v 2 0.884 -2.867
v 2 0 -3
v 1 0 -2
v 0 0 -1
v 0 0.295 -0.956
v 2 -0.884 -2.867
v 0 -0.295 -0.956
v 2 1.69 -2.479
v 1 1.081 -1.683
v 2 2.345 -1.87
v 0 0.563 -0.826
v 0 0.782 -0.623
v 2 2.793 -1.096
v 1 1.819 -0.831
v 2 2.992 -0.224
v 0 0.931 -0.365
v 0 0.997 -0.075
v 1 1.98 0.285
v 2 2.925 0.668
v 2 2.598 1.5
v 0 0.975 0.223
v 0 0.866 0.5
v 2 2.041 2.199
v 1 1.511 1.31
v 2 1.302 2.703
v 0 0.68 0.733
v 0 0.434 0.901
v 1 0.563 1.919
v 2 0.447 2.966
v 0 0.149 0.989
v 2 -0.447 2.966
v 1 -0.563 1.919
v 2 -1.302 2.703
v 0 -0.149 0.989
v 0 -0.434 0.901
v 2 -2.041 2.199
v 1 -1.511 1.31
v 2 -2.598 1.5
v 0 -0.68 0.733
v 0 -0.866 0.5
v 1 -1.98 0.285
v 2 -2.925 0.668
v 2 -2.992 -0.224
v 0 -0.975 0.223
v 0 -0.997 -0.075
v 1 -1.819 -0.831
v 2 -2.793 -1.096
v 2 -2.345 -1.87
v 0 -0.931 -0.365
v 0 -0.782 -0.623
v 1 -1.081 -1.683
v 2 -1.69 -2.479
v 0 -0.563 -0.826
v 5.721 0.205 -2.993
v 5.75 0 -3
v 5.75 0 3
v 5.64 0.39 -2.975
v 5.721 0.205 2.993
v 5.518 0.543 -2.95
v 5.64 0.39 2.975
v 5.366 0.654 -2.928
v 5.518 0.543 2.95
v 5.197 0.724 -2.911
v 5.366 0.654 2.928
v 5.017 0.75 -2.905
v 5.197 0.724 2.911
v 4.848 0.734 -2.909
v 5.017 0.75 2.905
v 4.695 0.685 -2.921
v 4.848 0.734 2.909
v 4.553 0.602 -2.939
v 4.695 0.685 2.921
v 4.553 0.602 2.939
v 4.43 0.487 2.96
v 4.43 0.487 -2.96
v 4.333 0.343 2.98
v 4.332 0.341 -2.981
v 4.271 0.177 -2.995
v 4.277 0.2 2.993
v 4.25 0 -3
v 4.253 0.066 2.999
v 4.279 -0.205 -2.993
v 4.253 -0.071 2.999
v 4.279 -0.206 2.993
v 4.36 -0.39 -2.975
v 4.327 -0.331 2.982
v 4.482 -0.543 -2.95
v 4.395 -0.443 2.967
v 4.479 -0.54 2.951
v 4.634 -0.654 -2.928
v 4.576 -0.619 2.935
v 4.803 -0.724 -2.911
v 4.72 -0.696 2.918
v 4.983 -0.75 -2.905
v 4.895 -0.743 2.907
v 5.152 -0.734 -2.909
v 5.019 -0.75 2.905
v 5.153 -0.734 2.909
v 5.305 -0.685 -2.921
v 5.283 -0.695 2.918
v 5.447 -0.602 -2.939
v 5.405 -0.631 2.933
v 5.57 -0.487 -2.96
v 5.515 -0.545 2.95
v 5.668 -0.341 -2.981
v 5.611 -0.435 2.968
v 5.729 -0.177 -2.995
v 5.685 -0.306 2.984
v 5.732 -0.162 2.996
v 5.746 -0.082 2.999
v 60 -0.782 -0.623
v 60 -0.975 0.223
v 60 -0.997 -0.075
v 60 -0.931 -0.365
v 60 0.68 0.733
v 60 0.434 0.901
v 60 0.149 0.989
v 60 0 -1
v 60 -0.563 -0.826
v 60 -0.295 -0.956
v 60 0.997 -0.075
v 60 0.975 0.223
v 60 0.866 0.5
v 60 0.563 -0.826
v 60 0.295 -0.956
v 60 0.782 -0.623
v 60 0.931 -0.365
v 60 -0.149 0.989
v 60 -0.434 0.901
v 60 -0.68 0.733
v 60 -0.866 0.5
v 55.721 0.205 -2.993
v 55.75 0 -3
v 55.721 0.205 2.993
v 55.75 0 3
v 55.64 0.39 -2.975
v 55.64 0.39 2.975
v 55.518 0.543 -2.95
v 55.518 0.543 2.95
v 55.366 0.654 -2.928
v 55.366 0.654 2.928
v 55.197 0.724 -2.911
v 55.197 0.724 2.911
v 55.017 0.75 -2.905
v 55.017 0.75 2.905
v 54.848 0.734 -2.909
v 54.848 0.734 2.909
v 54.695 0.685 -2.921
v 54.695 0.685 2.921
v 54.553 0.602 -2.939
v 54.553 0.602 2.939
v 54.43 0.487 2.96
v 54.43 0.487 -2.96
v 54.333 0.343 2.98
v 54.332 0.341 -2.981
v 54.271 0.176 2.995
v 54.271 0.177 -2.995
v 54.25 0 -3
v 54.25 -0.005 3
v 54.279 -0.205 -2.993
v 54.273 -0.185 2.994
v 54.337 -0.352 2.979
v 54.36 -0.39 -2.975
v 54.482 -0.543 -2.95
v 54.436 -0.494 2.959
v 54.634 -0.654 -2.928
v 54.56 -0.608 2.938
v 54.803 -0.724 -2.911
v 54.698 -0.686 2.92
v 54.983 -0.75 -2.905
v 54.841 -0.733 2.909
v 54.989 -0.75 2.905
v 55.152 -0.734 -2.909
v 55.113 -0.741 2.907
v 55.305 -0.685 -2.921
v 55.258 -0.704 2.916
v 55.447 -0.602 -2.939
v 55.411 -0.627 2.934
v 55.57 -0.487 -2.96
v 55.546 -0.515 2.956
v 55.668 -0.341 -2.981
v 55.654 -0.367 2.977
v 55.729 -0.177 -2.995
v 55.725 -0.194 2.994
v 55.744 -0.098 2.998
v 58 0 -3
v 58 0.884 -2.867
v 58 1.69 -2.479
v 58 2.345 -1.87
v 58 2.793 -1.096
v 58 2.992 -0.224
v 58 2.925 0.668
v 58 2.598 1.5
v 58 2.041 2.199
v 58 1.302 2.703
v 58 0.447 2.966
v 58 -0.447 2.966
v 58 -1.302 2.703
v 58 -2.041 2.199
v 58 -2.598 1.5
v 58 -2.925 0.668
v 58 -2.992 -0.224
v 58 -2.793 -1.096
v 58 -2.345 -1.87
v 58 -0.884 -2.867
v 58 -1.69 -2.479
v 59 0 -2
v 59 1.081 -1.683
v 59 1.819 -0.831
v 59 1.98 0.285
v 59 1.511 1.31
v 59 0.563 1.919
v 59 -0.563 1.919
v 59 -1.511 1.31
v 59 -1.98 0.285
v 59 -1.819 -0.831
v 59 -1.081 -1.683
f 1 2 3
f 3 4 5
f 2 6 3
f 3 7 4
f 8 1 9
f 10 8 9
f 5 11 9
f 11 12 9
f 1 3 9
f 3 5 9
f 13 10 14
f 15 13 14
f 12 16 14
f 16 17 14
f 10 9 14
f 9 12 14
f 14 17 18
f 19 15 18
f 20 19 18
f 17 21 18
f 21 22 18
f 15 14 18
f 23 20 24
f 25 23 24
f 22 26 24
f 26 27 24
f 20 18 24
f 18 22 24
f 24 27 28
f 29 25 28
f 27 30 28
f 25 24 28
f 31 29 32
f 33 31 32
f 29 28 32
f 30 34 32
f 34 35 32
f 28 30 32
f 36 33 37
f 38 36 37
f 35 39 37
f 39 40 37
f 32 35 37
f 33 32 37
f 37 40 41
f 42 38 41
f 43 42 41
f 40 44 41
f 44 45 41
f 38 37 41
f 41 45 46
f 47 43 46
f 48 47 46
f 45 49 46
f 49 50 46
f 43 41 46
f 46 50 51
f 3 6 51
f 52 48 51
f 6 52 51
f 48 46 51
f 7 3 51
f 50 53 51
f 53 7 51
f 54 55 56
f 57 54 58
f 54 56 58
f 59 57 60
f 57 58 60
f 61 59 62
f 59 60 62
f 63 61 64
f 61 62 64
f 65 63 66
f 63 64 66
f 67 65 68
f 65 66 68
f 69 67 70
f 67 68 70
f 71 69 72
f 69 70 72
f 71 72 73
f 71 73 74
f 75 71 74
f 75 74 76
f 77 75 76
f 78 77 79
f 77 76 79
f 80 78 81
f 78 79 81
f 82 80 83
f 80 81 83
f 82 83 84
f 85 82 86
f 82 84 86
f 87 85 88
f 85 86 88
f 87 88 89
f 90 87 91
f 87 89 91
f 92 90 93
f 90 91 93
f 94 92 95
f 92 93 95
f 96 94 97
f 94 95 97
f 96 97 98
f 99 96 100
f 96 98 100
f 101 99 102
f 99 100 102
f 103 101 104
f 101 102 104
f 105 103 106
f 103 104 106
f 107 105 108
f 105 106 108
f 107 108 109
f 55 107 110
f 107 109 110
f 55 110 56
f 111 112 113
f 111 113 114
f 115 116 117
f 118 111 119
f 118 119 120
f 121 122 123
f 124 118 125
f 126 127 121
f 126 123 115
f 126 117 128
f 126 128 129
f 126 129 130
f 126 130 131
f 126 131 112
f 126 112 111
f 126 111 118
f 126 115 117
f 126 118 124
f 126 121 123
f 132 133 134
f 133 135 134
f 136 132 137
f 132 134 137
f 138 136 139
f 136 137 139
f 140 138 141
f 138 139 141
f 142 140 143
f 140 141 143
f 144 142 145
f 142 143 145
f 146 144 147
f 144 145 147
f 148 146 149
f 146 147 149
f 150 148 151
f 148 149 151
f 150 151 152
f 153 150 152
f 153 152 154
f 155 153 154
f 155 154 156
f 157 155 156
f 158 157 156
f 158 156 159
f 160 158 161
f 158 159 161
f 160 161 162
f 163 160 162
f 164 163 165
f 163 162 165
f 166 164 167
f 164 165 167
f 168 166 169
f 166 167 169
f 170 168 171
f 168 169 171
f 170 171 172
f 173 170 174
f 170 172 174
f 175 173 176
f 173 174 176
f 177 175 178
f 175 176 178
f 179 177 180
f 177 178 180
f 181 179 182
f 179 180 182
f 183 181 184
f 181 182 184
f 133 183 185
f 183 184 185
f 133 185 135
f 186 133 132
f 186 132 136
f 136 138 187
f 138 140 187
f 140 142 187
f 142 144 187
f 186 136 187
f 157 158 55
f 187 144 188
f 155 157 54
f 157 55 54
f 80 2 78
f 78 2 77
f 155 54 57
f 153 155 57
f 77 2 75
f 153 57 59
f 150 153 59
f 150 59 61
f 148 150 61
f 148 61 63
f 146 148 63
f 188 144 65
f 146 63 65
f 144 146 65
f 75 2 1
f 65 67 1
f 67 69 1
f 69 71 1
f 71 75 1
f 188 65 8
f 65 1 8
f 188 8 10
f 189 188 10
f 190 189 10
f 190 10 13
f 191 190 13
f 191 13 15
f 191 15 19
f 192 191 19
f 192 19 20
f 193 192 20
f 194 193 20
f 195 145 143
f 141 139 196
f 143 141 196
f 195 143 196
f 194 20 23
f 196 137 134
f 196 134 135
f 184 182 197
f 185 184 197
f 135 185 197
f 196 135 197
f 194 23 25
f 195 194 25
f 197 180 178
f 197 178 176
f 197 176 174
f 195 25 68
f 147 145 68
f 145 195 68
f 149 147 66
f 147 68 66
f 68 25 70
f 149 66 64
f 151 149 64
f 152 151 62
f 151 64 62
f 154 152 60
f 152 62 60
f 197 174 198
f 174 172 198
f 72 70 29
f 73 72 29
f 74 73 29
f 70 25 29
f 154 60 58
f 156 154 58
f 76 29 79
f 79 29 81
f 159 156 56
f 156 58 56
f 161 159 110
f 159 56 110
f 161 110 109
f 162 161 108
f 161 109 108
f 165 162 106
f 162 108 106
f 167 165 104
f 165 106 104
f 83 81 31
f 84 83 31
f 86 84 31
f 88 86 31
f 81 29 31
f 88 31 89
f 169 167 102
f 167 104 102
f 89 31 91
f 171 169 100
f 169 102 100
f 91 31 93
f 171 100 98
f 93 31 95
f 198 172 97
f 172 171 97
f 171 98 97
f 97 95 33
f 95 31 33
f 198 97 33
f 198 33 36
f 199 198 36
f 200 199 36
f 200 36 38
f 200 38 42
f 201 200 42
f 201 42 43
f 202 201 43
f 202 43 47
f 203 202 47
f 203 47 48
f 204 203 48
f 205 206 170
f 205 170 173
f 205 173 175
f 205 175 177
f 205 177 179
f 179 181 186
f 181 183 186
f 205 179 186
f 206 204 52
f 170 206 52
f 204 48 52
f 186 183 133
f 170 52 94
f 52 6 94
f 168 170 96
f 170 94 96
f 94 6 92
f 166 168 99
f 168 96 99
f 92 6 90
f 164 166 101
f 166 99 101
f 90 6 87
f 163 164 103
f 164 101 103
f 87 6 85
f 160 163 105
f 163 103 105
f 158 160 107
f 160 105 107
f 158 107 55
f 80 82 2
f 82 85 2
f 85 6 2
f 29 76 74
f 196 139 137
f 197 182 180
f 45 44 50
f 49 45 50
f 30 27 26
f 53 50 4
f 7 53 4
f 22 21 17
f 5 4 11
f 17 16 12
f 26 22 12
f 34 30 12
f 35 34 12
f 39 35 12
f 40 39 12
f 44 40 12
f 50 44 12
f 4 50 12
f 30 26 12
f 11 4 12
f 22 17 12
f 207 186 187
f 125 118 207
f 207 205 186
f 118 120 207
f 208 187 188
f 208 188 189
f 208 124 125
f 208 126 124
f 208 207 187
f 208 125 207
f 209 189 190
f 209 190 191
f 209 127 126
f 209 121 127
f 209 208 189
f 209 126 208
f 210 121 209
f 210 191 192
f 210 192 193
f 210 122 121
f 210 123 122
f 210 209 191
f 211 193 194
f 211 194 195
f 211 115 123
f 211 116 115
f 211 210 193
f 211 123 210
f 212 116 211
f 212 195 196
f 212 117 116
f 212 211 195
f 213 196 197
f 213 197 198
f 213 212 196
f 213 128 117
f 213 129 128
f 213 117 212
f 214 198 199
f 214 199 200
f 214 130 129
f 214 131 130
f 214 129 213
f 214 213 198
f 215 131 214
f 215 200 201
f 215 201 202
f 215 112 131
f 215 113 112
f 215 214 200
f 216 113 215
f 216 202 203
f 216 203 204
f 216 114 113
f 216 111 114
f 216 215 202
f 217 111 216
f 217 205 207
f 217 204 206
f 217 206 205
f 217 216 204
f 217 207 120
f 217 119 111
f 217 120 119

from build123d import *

# Parameters (mm, degrees)
SKETCH_1_R               = 3
EXTRUDE_1_DEPTH          = 60
CHAMFER_1_SIZE           = 2
SKETCH_2_R               = 0.75
CUT_EXTRUDE_1_DEPTH      = 4
CUT_EXTRUDE_1_DEPTH_BACK = 4


with BuildPart() as part:
    # Эскиз1 → Бобышка-Вытянуть1 (new body)
    with BuildSketch(Plane(origin=(0, 0, 0), x_dir=(0, 0, -1), z_dir=(1, 0, 0))):
        Circle(SKETCH_1_R)
    extrude(amount=EXTRUDE_1_DEPTH)

    # Фаска1
    chamfer_1_edges = [part.edges().sort_by_distance(p)[0] for p in [
        (0, 0, 3),
        (60, 0, 3),
    ]]
    chamfer(chamfer_1_edges, length=CHAMFER_1_SIZE)

    # Эскиз2 → Вырез-Вытянуть1 (cut, two sides)
    with BuildSketch(Plane.XY) as cut_extrude_1_sk:
        with Locations((5, 0)):
            Circle(SKETCH_2_R)
        with Locations((55, 0)):
            Circle(SKETCH_2_R)
    extrude(amount=CUT_EXTRUDE_1_DEPTH, mode=Mode.SUBTRACT)
    extrude(cut_extrude_1_sk.sketch, amount=-CUT_EXTRUDE_1_DEPTH_BACK, mode=Mode.SUBTRACT)


solid = part.part
